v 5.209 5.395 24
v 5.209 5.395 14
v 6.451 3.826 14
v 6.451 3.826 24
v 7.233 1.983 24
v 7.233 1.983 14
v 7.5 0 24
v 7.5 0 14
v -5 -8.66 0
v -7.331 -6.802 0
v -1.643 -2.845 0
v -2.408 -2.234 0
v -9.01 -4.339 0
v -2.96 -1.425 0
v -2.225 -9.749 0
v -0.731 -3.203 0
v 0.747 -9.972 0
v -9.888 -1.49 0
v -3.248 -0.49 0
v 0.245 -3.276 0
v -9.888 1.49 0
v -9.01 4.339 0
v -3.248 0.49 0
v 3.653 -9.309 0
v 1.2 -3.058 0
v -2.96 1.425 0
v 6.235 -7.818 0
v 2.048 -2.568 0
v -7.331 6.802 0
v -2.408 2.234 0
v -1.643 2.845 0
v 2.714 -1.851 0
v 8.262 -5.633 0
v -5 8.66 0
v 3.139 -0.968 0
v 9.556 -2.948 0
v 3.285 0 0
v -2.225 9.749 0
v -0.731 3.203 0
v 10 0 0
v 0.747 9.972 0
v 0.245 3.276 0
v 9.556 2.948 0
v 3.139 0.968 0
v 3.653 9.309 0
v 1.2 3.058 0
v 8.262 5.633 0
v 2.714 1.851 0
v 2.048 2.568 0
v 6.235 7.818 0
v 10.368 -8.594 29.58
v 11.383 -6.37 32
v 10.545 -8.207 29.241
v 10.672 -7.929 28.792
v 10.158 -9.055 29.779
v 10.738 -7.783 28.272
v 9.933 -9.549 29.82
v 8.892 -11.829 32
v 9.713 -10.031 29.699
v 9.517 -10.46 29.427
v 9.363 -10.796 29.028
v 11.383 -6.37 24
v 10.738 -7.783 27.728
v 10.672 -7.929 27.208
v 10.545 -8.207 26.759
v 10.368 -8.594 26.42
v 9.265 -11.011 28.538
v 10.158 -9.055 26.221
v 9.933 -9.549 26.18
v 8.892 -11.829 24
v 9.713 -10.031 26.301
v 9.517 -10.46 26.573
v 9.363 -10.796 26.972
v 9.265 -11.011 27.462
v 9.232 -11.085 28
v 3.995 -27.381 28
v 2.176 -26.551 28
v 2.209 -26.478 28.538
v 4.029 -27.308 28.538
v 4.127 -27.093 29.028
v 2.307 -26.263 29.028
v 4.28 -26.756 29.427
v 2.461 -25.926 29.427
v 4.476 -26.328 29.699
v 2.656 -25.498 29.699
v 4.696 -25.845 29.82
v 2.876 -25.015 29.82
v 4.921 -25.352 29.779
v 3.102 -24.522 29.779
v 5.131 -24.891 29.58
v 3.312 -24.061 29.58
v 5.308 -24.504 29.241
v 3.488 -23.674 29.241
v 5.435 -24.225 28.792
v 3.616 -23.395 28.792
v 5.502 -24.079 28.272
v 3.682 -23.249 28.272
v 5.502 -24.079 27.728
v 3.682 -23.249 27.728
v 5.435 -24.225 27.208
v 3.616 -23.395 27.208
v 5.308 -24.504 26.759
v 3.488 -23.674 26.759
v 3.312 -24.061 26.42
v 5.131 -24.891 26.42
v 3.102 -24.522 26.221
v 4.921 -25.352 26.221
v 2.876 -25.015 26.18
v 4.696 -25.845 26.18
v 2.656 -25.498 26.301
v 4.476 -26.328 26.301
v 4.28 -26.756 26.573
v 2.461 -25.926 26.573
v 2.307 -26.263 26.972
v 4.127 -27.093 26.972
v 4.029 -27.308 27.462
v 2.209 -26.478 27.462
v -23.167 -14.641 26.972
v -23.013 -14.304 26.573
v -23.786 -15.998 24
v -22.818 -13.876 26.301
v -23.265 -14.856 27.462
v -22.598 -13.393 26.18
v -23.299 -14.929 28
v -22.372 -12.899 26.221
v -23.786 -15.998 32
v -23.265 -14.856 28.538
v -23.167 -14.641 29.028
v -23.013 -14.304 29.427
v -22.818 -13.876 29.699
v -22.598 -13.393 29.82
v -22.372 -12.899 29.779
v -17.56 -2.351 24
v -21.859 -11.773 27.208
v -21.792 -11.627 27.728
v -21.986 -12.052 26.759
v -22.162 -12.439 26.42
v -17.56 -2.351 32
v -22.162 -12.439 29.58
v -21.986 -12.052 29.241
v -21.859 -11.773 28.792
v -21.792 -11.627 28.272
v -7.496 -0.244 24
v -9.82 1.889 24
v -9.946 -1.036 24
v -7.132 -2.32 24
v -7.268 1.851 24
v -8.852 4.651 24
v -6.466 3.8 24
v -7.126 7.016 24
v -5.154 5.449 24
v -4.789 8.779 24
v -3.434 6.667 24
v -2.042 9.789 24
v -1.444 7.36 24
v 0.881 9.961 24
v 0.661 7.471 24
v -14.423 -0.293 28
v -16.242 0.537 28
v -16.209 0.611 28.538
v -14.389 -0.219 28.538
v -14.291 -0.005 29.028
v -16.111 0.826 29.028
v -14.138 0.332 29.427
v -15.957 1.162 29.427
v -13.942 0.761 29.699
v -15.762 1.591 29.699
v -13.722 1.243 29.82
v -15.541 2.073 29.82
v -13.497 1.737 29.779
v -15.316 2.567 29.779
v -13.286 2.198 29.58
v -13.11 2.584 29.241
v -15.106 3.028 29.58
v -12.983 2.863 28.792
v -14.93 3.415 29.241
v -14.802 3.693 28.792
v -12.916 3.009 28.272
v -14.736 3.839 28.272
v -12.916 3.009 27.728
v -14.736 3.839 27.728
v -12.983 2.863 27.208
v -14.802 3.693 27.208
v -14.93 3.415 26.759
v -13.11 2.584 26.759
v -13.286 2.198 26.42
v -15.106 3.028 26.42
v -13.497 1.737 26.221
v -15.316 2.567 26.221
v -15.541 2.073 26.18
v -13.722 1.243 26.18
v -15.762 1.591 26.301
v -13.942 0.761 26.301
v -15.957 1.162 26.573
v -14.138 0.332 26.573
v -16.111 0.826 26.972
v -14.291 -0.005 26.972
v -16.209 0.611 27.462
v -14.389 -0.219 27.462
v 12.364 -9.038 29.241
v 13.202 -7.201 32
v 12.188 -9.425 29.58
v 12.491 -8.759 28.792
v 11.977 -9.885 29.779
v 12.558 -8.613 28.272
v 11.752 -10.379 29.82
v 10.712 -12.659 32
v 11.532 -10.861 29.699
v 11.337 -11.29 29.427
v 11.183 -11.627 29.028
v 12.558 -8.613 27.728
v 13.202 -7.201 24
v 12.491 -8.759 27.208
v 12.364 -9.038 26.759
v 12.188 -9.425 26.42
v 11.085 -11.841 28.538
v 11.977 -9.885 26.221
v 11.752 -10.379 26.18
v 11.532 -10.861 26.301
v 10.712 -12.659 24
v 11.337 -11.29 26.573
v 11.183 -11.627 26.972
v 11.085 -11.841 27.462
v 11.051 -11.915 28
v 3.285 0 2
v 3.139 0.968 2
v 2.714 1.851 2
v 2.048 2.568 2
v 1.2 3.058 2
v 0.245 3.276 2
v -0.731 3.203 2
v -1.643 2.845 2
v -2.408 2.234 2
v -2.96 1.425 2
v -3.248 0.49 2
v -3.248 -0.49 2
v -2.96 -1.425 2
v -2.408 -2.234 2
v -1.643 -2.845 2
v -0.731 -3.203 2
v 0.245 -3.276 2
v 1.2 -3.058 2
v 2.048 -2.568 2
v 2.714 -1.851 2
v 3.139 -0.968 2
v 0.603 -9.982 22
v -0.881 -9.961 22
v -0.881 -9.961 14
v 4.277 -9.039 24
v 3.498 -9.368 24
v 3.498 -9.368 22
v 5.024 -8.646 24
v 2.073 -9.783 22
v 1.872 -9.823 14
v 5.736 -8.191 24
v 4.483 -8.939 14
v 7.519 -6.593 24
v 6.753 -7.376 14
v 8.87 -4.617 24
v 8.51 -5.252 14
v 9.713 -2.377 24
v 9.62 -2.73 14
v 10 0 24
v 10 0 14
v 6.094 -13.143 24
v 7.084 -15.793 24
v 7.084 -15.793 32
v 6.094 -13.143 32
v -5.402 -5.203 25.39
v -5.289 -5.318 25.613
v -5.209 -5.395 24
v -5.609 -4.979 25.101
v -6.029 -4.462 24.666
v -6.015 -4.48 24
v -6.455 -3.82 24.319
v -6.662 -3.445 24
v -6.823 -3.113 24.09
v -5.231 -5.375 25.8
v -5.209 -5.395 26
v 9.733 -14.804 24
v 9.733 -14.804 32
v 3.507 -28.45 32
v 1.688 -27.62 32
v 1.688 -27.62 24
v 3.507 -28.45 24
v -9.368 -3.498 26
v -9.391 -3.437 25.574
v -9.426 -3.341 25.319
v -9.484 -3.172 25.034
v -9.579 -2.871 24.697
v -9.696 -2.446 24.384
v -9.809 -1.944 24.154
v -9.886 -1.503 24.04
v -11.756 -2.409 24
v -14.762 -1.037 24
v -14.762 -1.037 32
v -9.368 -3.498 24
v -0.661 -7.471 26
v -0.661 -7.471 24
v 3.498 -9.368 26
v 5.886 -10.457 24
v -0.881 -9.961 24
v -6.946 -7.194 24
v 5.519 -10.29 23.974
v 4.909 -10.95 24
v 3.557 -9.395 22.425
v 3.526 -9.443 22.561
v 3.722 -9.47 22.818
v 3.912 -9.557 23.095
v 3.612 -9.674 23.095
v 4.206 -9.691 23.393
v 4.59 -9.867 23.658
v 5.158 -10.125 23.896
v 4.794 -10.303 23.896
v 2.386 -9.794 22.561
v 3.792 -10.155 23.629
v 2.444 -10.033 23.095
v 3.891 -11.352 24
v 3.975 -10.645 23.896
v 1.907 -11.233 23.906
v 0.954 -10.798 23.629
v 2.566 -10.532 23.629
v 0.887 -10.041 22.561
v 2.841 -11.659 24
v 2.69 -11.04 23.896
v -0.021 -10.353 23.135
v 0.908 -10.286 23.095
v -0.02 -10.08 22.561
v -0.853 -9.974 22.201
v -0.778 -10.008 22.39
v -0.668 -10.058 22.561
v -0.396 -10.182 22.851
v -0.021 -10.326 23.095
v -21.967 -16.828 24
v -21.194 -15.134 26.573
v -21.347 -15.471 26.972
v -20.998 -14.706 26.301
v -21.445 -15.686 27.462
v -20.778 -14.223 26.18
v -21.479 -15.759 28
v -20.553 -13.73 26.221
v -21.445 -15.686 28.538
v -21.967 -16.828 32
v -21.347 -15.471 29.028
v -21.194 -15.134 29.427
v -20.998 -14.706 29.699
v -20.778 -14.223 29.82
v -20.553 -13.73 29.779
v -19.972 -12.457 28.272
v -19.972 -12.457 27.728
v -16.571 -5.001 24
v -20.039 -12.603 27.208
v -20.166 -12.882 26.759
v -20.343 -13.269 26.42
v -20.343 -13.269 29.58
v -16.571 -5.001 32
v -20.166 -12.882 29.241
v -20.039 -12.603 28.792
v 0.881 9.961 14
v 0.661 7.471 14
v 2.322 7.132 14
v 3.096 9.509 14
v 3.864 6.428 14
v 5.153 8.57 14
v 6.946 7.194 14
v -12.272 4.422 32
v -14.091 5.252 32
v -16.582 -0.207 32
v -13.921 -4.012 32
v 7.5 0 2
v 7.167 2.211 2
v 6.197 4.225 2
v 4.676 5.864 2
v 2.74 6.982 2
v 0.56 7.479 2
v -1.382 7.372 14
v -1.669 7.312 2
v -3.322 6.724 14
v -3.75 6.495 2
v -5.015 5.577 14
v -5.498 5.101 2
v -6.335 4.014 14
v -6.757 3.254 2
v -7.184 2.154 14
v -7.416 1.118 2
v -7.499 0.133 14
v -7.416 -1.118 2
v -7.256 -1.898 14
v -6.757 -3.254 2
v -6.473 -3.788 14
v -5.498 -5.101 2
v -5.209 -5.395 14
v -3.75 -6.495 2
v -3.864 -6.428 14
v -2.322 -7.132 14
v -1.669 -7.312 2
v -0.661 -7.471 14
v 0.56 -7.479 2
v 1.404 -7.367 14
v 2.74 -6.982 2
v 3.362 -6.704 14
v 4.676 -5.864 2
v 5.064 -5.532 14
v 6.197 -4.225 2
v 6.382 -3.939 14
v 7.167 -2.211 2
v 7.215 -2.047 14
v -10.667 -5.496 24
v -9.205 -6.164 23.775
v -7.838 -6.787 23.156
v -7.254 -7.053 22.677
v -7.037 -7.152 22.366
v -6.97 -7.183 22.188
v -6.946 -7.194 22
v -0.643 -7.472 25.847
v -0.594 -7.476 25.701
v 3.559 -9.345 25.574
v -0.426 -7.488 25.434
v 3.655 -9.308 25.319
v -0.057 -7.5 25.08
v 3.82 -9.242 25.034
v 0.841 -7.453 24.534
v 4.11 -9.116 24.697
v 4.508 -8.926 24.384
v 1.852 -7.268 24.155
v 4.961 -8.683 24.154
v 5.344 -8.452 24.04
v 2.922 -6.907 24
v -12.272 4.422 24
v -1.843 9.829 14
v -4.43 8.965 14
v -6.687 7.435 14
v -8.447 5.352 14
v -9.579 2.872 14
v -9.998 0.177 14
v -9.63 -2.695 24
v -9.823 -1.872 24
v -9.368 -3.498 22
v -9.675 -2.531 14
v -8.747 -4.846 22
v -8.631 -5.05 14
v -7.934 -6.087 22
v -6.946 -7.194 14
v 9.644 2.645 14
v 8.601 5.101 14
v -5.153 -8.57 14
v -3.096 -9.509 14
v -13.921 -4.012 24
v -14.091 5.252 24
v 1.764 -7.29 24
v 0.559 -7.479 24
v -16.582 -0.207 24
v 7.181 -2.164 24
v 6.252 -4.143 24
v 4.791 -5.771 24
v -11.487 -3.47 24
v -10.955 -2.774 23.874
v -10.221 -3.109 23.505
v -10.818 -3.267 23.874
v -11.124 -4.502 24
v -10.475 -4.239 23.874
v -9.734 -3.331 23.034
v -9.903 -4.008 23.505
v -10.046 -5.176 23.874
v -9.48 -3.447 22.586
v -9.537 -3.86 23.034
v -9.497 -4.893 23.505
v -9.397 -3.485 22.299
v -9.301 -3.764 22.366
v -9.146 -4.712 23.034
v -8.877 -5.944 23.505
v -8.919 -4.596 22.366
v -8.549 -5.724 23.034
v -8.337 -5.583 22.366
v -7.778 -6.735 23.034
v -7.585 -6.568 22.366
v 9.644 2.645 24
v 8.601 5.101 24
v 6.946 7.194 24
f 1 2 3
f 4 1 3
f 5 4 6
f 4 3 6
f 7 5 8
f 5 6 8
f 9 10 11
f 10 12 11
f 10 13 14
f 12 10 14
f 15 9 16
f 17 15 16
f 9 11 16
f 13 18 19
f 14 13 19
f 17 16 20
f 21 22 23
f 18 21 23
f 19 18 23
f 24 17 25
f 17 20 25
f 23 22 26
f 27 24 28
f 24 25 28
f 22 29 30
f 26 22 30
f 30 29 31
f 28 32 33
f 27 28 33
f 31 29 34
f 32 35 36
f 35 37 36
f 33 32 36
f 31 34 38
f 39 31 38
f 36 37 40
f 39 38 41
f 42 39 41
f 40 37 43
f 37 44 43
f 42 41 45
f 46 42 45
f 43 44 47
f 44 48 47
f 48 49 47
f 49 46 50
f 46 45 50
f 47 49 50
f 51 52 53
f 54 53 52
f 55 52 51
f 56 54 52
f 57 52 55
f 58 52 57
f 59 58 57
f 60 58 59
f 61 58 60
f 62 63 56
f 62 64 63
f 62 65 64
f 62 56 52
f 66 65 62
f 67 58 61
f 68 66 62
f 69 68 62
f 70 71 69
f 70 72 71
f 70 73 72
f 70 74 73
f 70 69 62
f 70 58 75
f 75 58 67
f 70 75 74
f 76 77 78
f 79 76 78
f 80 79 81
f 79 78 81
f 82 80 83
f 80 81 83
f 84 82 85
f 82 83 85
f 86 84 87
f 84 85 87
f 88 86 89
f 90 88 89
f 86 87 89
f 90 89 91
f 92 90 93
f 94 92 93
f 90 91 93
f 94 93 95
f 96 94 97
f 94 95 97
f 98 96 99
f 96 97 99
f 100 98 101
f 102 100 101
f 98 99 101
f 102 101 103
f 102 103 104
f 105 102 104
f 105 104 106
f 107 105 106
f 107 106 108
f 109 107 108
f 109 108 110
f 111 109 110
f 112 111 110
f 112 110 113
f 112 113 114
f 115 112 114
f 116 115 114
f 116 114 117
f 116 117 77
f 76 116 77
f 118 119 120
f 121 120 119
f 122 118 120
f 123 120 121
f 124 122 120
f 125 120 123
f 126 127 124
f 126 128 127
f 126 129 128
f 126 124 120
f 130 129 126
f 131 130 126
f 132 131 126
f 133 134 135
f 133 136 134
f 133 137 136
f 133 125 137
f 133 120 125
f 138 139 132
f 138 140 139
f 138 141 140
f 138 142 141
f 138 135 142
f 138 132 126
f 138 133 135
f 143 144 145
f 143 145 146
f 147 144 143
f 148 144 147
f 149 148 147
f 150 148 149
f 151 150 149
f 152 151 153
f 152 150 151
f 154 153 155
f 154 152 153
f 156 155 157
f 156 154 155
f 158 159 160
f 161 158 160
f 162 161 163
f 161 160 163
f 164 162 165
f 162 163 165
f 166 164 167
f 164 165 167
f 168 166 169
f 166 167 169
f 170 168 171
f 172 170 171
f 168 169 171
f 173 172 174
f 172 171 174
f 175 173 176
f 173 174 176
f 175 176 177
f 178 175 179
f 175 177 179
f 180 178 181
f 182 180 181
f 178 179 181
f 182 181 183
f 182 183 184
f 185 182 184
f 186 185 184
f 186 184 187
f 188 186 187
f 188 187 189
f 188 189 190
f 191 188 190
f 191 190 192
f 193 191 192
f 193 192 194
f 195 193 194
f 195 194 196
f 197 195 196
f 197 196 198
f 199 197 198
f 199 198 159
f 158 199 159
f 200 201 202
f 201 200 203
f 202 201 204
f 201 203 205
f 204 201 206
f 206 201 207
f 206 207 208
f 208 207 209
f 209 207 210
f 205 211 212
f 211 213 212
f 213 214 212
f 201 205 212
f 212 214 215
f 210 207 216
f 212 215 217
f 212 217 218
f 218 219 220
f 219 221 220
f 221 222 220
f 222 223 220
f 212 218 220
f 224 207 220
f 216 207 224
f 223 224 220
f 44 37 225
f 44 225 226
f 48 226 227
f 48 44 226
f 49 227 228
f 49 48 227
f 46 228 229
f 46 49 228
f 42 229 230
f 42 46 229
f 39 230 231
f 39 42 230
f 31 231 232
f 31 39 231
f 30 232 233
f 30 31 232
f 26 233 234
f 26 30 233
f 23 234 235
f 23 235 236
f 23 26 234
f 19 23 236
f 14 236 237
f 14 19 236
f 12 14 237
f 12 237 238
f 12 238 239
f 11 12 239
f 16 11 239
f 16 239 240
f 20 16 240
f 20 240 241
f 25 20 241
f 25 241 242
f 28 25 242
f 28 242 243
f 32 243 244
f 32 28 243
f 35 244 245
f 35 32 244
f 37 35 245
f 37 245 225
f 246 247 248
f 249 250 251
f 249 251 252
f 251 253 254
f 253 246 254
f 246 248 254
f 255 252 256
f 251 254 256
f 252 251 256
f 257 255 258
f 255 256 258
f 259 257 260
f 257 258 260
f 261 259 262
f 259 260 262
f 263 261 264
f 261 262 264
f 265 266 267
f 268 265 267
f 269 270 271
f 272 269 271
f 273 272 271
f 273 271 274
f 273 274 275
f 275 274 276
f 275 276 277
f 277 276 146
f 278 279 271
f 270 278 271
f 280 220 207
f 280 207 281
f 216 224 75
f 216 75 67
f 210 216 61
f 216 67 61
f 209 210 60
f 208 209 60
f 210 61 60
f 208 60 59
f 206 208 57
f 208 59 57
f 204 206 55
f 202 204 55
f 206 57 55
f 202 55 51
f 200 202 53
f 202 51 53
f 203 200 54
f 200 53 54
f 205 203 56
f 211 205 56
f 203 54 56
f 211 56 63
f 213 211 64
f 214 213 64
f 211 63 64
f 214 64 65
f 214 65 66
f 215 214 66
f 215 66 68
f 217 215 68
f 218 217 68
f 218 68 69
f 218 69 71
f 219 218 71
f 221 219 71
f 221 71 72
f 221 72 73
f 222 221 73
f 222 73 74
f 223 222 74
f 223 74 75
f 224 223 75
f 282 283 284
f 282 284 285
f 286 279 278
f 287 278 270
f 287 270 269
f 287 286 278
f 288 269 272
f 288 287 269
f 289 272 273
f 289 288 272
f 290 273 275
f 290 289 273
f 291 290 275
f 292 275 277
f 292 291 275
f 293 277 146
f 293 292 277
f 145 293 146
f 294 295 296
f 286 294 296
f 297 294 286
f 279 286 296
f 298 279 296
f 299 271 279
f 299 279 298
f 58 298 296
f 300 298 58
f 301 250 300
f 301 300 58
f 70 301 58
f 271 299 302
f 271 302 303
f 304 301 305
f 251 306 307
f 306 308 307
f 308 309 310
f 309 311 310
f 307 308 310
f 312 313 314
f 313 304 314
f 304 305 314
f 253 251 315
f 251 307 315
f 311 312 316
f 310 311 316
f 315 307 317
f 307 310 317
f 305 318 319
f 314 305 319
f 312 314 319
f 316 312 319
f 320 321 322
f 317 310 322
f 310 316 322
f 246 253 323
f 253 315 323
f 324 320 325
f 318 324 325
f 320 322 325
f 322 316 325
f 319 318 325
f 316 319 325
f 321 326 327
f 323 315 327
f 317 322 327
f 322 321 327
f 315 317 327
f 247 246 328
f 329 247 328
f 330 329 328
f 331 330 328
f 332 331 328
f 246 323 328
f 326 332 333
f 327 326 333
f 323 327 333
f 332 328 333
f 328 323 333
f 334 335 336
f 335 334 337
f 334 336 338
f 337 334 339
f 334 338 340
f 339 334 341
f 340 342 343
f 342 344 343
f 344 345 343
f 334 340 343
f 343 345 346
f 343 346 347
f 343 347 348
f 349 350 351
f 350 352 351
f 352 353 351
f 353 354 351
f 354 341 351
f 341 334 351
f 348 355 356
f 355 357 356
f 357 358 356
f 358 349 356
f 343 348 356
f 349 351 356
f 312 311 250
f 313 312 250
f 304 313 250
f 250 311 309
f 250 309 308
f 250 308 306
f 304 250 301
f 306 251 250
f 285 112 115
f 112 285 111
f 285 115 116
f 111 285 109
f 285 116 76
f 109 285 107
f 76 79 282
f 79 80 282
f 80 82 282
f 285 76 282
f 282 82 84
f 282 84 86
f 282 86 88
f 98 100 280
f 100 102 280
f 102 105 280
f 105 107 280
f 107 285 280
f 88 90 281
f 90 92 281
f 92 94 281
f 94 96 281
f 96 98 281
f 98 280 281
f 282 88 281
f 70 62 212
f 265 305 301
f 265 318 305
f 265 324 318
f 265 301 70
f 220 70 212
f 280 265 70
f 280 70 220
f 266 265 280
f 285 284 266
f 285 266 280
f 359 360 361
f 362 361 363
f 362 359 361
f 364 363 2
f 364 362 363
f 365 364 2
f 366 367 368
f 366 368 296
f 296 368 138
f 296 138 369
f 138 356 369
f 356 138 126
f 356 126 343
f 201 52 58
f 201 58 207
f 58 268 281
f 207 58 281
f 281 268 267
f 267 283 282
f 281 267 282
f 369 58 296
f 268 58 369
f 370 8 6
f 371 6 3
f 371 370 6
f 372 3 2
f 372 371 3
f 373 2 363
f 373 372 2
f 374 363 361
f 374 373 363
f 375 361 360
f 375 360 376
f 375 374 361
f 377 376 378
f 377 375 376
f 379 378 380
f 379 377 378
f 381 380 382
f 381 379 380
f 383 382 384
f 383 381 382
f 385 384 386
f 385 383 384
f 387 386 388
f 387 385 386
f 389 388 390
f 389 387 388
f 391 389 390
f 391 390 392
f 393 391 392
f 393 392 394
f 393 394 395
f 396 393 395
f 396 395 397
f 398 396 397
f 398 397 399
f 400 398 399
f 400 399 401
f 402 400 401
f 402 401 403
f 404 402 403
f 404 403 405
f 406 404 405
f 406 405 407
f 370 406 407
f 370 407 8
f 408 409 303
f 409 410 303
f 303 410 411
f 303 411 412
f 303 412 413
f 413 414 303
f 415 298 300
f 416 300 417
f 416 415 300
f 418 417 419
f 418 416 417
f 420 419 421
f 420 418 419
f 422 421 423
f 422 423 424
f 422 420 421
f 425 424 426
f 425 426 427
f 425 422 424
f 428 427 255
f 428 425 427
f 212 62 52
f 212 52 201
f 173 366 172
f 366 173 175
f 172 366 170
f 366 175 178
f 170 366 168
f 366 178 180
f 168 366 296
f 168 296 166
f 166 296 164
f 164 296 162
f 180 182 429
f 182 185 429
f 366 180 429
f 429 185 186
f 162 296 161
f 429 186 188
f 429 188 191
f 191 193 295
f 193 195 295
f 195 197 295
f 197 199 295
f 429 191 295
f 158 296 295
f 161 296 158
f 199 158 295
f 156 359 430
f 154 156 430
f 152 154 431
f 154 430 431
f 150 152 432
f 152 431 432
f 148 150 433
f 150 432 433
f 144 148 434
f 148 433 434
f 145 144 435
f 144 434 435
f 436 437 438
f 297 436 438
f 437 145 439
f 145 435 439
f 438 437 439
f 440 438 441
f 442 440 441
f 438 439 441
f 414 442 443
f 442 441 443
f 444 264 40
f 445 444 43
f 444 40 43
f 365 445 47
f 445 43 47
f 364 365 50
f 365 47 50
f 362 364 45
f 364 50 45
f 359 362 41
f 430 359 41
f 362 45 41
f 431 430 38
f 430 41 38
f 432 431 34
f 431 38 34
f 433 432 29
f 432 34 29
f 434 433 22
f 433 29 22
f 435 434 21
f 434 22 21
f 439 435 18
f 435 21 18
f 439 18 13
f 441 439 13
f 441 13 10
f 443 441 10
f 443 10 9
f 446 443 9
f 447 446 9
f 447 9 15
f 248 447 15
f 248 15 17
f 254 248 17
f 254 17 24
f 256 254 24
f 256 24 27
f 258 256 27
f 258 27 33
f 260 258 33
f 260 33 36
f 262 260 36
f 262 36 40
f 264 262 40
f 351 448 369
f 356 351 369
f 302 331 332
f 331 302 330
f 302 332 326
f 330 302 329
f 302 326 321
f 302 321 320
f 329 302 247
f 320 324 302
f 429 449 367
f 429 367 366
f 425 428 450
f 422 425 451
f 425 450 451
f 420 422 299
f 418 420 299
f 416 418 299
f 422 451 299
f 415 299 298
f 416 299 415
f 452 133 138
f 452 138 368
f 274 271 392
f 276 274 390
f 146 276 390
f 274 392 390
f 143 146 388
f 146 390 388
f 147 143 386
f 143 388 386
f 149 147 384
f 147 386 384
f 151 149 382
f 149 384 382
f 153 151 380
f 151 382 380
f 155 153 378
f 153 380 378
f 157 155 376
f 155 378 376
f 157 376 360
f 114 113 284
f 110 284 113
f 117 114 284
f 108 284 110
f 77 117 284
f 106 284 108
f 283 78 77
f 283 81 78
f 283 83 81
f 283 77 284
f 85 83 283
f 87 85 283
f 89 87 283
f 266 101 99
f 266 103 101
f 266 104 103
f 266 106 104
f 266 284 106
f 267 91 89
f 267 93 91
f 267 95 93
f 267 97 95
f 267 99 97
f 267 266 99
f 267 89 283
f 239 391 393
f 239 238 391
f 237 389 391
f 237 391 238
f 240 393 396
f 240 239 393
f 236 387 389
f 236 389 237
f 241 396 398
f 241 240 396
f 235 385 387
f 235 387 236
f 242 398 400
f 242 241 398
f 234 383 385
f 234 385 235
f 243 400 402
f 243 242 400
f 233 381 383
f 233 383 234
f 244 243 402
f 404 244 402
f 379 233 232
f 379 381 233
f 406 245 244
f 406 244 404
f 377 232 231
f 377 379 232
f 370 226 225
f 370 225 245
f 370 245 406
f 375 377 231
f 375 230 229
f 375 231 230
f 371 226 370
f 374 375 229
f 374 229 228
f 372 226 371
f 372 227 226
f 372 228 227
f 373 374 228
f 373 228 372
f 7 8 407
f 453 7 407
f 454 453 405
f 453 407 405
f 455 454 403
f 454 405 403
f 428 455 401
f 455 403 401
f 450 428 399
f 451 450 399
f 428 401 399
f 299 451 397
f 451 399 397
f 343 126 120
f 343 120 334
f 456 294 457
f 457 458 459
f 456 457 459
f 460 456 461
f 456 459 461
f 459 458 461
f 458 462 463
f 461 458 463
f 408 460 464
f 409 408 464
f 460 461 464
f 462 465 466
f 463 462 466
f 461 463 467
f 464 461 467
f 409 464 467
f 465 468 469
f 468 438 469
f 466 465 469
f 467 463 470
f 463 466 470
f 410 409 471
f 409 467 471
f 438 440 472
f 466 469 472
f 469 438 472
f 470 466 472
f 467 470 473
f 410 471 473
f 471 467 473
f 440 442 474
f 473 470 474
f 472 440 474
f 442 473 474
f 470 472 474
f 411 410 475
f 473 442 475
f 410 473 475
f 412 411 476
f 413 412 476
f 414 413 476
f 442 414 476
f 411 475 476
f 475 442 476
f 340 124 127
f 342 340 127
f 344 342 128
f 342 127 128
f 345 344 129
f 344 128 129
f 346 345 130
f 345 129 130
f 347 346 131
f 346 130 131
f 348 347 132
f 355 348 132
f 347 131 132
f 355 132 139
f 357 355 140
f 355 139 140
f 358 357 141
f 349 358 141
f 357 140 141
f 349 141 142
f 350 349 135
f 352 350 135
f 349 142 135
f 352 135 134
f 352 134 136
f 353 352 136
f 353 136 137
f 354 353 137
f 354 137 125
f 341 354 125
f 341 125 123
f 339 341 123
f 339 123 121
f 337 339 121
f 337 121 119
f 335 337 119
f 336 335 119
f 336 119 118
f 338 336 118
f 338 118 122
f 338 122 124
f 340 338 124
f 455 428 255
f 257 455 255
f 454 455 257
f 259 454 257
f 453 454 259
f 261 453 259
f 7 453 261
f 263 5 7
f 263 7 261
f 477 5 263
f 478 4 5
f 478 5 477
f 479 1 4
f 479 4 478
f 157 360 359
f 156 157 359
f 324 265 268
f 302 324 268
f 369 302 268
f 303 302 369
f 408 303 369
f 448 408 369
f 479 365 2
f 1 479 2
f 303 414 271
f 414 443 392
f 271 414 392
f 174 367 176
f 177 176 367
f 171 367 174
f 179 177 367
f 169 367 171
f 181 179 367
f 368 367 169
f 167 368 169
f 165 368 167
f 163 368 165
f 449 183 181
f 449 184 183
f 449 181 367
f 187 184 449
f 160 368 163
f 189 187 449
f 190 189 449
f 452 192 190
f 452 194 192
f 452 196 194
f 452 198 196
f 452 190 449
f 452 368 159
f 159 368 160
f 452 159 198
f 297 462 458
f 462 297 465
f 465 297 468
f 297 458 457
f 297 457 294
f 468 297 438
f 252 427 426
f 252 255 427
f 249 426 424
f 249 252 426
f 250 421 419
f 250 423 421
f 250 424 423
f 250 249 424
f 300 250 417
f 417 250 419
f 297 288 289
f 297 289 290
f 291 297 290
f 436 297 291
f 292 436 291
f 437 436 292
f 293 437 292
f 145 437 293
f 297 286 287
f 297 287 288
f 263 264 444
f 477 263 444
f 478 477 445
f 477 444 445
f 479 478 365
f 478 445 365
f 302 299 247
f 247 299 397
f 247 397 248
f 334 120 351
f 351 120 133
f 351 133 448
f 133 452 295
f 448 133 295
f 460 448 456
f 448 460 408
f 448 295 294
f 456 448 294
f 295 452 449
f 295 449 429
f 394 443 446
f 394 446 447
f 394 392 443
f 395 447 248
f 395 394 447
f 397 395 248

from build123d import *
from build123d.topology import SkipClean

# Parameters (mm, degrees)
SKETCH1_R           = 7.5
SKETCH1_R_2         = 3.285
BOSS_EXTRUDE1_DEPTH = 2
SKETCH1_3_R         = 10
SKETCH1_3_R_2       = 7.5
BOSS_EXTRUDE2_DEPTH = 14
BOSS_EXTRUDE3_DEPTH = 10
BOSS_EXTRUDE4_DEPTH = 8
FILLET1_R           = 2
FILLET2_R           = 2
SKETCH4_W           = 2
SKETCH4_H           = 8
BOSS_EXTRUDE5_DEPTH = 15
CHAMFER1_SIZE       = 2
CUT_EXTRUDE1_REACH  = 55.102
SKETCH6_R           = 1.825
SKETCH7_W           = 2
SKETCH7_H           = 8
BOSS_EXTRUDE6_DEPTH = 6
CUT_EXTRUDE2_REACH  = 56.289
SKETCH8_R           = 1.825


with BuildPart() as part:
    # Sketch1 → Boss-Extrude1 (new body)
    with BuildSketch(Plane.XY):
        Circle(SKETCH1_R)
        Circle(SKETCH1_R_2, mode=Mode.SUBTRACT)
    extrude(amount=BOSS_EXTRUDE1_DEPTH)

    # Sketch1<3> → Boss-Extrude2 (add)
    with BuildSketch(Plane.XY):
        Circle(SKETCH1_3_R)
        Circle(SKETCH1_3_R_2, mode=Mode.SUBTRACT)
    extrude(amount=BOSS_EXTRUDE2_DEPTH)

    # Sketch2 → Boss-Extrude3 (add)
    with SkipClean():  # the faces are left unmerged after this step: merging them gives an invalid solid
        with BuildSketch(Plane.XY.offset(14)):
            with BuildLine():
                ThreePointArc((0.880723614, 9.961140794), (-9.097879067, 4.150734451), (-6.945976325, -7.193984493))
                Line((-6.945976325, -7.193984493), (-5.209482244, -5.39548837))
                ThreePointArc((-5.209482244, -5.39548837), (-6.8234093, 3.113050838), (0.66054271, 7.470855595))
                Line((0.66054271, 7.470855595), (0.880723614, 9.961140794))
            make_face()
            with BuildLine():
                Line((-0.66054271, -7.470855595), (-0.880723614, -9.961140794))
                ThreePointArc((-0.880723614, -9.961140794), (6.752509306, -7.375880833), (10, 0))
                ThreePointArc((10, 0), (9.204883575, 3.907699883), (6.945976325, 7.193984493))
                Line((6.945976325, 7.193984493), (5.209482244, 5.39548837))
                ThreePointArc((5.209482244, 5.39548837), (6.903662681, 2.930774912), (7.5, 0))
                ThreePointArc((7.5, 0), (5.06438198, -5.531910625), (-0.66054271, -7.470855595))
            make_face()
        extrude(amount=BOSS_EXTRUDE3_DEPTH)

    # Sketch3 → Boss-Extrude4 (add)
    with SkipClean():  # the faces are left unmerged after this step: merging them gives an invalid solid
        with BuildSketch(Plane.XY.offset(24)):
            Polygon((10.711806124, -12.659273659), (9.733468631, -14.80366432), (-17.56016857, -2.351460968), (-16.581831078, -0.207070307), align=None)
        extrude(amount=BOSS_EXTRUDE4_DEPTH)

    # Fillet1
    # the kernel refuses this fillet: 2 mm, written as the material it adds along each edge
    with BuildSketch(Plane(origin=(-5.209482244, -5.39548837, 24), x_dir=(0.4150734450654639, 0.9097879067131457, 0), z_dir=(0.9097879067131457, -0.41507344506546395, 0))) as fillet1_piece_1_section:
        with BuildLine():
            CenterArc((FILLET1_R, FILLET1_R), FILLET1_R, 180, 90)
            Line((0, FILLET1_R), (0, 0))
            Line((0, 0), (FILLET1_R, 0))
        make_face()
    fillet1_piece_1 = extrude(amount=14.571067812, mode=Mode.PRIVATE)
    fillet1_piece_1 = fillet1_piece_1 & Plane(origin=(0, 0, 24.466684855), x_dir=(-0.08807236135728662, -0.9961140793929938, 0), z_dir=(0, 0, -1)) * Cylinder(10, 38, mode=Mode.PRIVATE)
    fillet1_piece_1 = fillet1_piece_1 - Plane(origin=(0, 0, 24.466684855), x_dir=(0.6945976324993828, 0.7193984493493522, 0), z_dir=(0, 0, -1)) * Cylinder(7.5, 38, mode=Mode.PRIVATE)
    add(fillet1_piece_1)
    with BuildSketch(Plane(origin=(-13.917123993, -1.42279228, 24), x_dir=(0.4150734450654639, 0.9097879067131457, 0), z_dir=(0.9097879067131457, -0.41507344506546395, 0))) as fillet1_piece_2_section:
        with BuildLine():
            CenterArc((FILLET1_R, FILLET1_R), FILLET1_R, 180, 90)
            Line((0, FILLET1_R), (0, 0))
            Line((0, 0), (FILLET1_R, 0))
        make_face()
    fillet1_piece_2 = extrude(amount=14.571067812, mode=Mode.PRIVATE)
    fillet1_piece_2 = fillet1_piece_2 & Plane(origin=(0, 0, 24.466680249), x_dir=(0.08807236135728662, 0.9961140793929938, 0), z_dir=(0, 0, -1)) * Cylinder(10, 38, mode=Mode.PRIVATE)
    fillet1_piece_2 = fillet1_piece_2 - Plane(origin=(0, 0, 24.466680249), x_dir=(0.6945976324993828, 0.7193984493493522, 0), z_dir=(0, 0, -1)) * Cylinder(7.5, 38, mode=Mode.PRIVATE)
    add(fillet1_piece_2)

    # Fillet2
    # the kernel refuses this fillet: 2 mm, written as the material it adds along each edge
    with BuildSketch(Plane(origin=(0, 0, 24), x_dir=(-0.9898439357335846, 0.14215830222483344, 0), z_dir=(0.14215830222483344, 0.9898439357335846, 0))) as fillet2_piece_1_section:
        with BuildLine():
            CenterArc((10 + FILLET2_R, -FILLET2_R), FILLET2_R, 90, 90)
            Line((10 + FILLET2_R, 0), (10, 0))
            Line((10, 0), (10, -FILLET2_R))
        make_face()
    fillet2_piece_1 = revolve(axis=Axis((0, 0, 24), (0, 0, 1)), revolution_arc=82.826410261, mode=Mode.PRIVATE)
    fillet2_piece_1 = split(fillet2_piece_1, bisect_by=Plane(origin=(-8.477218422, -3.904645831, 23.537511225), z_dir=(-0.41507344506546395, -0.9097879067131457, 0)), keep=Keep.TOP, mode=Mode.PRIVATE)
    fillet2_piece_1 = split(fillet2_piece_1, bisect_by=Plane(origin=(-9.455555915, -6.049036492, 23.537511225), z_dir=(0.41507344506546395, 0.9097879067131456, 0)), keep=Keep.TOP, mode=Mode.PRIVATE)
    add(fillet2_piece_1)
    with BuildSketch(Plane(origin=(0, 0, 24), x_dir=(0.7561376391606037, -0.6544126149797455, 0), z_dir=(0.6544126149797455, 0.7561376391606037, 0))) as fillet2_piece_2_section:
        with BuildLine():
            CenterArc((10 + FILLET2_R, FILLET2_R), FILLET2_R, 180, 90)
            Line((10 + FILLET2_R, 0), (10, 0))
            Line((10, 0), (10, FILLET2_R))
        make_face()
    fillet2_piece_2 = revolve(axis=Axis((0, 0, 24), (0, 0, -1)), revolution_arc=82.826410261, mode=Mode.PRIVATE)
    fillet2_piece_2 = split(fillet2_piece_2, bisect_by=Plane(origin=(2.607194883, -8.96169878, 23.537511389), z_dir=(-0.41507344506546395, -0.9097879067131457, 0)), keep=Keep.TOP, mode=Mode.PRIVATE)
    fillet2_piece_2 = split(fillet2_piece_2, bisect_by=Plane(origin=(1.628857391, -11.106089441, 23.537511389), z_dir=(0.41507344506546395, 0.9097879067131456, 0)), keep=Keep.TOP, mode=Mode.PRIVATE)
    add(fillet2_piece_2)

    # Sketch4 → Boss-Extrude5 (add)
    with BuildSketch(Plane(origin=(-3.913349969, -8.577562644, 0), x_dir=(0.9097879067131455, -0.4150734450654641, 0), z_dir=(-0.4150734450654641, -0.9097879067131455, 0))):
        with Locations((-14, 28)):
            Rectangle(SKETCH4_W, SKETCH4_H)
        with Locations((14, 28)):
            Rectangle(SKETCH4_W, SKETCH4_H)
    extrude(amount=BOSS_EXTRUDE5_DEPTH)

    # Chamfer1
    chamfer1_edges = [part.edges().sort_by_distance(p)[0] for p in [
        (-15.740592757, -3.181607858, 28),
        (7.913892818, -13.97351743, 28),
    ]]
    chamfer(chamfer1_edges, length=CHAMFER1_SIZE)

    # Cut-Extrude1: up to this face of the body (flat: up to its plane)
    cut_extrude1_end = Plane(part.part.faces().sort_by_distance((7.10958654, -20.55487829, 28))[0])
    # Sketch6 → Cut-Extrude1 (cut, up to the picked face)
    with BuildSketch(Plane(origin=(-13.646818601, 6.226101676, 0), x_dir=(0, 0, 1), z_dir=(-0.9097879067131456, 0.41507344506546384, 0)), mode=Mode.PRIVATE) as cut_extrude1_sk1:
        with Locations(Location((28, -21.428090416, 0), (0, 0, 270))):
            Circle(SKETCH6_R)
    cut_extrude1_tool1 = split(extrude(cut_extrude1_sk1.sketch, amount=-CUT_EXTRUDE1_REACH, mode=Mode.PRIVATE), bisect_by=cut_extrude1_end, keep=Keep.BOTH, mode=Mode.PRIVATE)
    add(cut_extrude1_tool1.solids().sort_by(Axis((-22.54105, -13.268916, 28), (0.9097879067131456, -0.41507344506546384, 0)))[0], mode=Mode.SUBTRACT)

    # Sketch7 → Boss-Extrude6 (add)
    with BuildSketch(Plane(origin=(-2.935012477, -6.433171983, 0), x_dir=(0.9097879067131457, -0.4150734450654639, 0), z_dir=(0.41507344506546384, 0.9097879067131456, 0))):
        with Locations((14, -28)):
            Rectangle(SKETCH7_W, SKETCH7_H)
        with Locations((-14, -28)):
            Rectangle(SKETCH7_W, SKETCH7_H)
    extrude(amount=BOSS_EXTRUDE6_DEPTH)

    # Cut-Extrude2: up to this face of the body (flat: up to its plane)
    cut_extrude2_end = Plane(part.part.faces().sort_by_distance((7.301672081, -20.133851349, 28))[0])
    # Sketch8 → Cut-Extrude2 (cut, up to the picked face)
    with BuildSketch(Plane(origin=(-13.646818601, 6.226101676, 0), x_dir=(0, 0, 1), z_dir=(-0.9097879067131456, 0.4150734450654639, 0)), mode=Mode.PRIVATE) as cut_extrude2_sk1:
        with Locations(Location((28, -4.428090416, 0), (0, 0, 270))):
            Circle(SKETCH8_R)
    cut_extrude2_tool1 = split(extrude(cut_extrude2_sk1.sketch, amount=-CUT_EXTRUDE2_REACH, mode=Mode.PRIVATE), bisect_by=cut_extrude2_end, keep=Keep.BOTH, mode=Mode.PRIVATE)
    add(cut_extrude2_tool1.solids().sort_by(Axis((-15.484801, 2.197479, 28), (0.9097879067131456, -0.4150734450654639, 0)))[0], mode=Mode.SUBTRACT)


solid = part.part
